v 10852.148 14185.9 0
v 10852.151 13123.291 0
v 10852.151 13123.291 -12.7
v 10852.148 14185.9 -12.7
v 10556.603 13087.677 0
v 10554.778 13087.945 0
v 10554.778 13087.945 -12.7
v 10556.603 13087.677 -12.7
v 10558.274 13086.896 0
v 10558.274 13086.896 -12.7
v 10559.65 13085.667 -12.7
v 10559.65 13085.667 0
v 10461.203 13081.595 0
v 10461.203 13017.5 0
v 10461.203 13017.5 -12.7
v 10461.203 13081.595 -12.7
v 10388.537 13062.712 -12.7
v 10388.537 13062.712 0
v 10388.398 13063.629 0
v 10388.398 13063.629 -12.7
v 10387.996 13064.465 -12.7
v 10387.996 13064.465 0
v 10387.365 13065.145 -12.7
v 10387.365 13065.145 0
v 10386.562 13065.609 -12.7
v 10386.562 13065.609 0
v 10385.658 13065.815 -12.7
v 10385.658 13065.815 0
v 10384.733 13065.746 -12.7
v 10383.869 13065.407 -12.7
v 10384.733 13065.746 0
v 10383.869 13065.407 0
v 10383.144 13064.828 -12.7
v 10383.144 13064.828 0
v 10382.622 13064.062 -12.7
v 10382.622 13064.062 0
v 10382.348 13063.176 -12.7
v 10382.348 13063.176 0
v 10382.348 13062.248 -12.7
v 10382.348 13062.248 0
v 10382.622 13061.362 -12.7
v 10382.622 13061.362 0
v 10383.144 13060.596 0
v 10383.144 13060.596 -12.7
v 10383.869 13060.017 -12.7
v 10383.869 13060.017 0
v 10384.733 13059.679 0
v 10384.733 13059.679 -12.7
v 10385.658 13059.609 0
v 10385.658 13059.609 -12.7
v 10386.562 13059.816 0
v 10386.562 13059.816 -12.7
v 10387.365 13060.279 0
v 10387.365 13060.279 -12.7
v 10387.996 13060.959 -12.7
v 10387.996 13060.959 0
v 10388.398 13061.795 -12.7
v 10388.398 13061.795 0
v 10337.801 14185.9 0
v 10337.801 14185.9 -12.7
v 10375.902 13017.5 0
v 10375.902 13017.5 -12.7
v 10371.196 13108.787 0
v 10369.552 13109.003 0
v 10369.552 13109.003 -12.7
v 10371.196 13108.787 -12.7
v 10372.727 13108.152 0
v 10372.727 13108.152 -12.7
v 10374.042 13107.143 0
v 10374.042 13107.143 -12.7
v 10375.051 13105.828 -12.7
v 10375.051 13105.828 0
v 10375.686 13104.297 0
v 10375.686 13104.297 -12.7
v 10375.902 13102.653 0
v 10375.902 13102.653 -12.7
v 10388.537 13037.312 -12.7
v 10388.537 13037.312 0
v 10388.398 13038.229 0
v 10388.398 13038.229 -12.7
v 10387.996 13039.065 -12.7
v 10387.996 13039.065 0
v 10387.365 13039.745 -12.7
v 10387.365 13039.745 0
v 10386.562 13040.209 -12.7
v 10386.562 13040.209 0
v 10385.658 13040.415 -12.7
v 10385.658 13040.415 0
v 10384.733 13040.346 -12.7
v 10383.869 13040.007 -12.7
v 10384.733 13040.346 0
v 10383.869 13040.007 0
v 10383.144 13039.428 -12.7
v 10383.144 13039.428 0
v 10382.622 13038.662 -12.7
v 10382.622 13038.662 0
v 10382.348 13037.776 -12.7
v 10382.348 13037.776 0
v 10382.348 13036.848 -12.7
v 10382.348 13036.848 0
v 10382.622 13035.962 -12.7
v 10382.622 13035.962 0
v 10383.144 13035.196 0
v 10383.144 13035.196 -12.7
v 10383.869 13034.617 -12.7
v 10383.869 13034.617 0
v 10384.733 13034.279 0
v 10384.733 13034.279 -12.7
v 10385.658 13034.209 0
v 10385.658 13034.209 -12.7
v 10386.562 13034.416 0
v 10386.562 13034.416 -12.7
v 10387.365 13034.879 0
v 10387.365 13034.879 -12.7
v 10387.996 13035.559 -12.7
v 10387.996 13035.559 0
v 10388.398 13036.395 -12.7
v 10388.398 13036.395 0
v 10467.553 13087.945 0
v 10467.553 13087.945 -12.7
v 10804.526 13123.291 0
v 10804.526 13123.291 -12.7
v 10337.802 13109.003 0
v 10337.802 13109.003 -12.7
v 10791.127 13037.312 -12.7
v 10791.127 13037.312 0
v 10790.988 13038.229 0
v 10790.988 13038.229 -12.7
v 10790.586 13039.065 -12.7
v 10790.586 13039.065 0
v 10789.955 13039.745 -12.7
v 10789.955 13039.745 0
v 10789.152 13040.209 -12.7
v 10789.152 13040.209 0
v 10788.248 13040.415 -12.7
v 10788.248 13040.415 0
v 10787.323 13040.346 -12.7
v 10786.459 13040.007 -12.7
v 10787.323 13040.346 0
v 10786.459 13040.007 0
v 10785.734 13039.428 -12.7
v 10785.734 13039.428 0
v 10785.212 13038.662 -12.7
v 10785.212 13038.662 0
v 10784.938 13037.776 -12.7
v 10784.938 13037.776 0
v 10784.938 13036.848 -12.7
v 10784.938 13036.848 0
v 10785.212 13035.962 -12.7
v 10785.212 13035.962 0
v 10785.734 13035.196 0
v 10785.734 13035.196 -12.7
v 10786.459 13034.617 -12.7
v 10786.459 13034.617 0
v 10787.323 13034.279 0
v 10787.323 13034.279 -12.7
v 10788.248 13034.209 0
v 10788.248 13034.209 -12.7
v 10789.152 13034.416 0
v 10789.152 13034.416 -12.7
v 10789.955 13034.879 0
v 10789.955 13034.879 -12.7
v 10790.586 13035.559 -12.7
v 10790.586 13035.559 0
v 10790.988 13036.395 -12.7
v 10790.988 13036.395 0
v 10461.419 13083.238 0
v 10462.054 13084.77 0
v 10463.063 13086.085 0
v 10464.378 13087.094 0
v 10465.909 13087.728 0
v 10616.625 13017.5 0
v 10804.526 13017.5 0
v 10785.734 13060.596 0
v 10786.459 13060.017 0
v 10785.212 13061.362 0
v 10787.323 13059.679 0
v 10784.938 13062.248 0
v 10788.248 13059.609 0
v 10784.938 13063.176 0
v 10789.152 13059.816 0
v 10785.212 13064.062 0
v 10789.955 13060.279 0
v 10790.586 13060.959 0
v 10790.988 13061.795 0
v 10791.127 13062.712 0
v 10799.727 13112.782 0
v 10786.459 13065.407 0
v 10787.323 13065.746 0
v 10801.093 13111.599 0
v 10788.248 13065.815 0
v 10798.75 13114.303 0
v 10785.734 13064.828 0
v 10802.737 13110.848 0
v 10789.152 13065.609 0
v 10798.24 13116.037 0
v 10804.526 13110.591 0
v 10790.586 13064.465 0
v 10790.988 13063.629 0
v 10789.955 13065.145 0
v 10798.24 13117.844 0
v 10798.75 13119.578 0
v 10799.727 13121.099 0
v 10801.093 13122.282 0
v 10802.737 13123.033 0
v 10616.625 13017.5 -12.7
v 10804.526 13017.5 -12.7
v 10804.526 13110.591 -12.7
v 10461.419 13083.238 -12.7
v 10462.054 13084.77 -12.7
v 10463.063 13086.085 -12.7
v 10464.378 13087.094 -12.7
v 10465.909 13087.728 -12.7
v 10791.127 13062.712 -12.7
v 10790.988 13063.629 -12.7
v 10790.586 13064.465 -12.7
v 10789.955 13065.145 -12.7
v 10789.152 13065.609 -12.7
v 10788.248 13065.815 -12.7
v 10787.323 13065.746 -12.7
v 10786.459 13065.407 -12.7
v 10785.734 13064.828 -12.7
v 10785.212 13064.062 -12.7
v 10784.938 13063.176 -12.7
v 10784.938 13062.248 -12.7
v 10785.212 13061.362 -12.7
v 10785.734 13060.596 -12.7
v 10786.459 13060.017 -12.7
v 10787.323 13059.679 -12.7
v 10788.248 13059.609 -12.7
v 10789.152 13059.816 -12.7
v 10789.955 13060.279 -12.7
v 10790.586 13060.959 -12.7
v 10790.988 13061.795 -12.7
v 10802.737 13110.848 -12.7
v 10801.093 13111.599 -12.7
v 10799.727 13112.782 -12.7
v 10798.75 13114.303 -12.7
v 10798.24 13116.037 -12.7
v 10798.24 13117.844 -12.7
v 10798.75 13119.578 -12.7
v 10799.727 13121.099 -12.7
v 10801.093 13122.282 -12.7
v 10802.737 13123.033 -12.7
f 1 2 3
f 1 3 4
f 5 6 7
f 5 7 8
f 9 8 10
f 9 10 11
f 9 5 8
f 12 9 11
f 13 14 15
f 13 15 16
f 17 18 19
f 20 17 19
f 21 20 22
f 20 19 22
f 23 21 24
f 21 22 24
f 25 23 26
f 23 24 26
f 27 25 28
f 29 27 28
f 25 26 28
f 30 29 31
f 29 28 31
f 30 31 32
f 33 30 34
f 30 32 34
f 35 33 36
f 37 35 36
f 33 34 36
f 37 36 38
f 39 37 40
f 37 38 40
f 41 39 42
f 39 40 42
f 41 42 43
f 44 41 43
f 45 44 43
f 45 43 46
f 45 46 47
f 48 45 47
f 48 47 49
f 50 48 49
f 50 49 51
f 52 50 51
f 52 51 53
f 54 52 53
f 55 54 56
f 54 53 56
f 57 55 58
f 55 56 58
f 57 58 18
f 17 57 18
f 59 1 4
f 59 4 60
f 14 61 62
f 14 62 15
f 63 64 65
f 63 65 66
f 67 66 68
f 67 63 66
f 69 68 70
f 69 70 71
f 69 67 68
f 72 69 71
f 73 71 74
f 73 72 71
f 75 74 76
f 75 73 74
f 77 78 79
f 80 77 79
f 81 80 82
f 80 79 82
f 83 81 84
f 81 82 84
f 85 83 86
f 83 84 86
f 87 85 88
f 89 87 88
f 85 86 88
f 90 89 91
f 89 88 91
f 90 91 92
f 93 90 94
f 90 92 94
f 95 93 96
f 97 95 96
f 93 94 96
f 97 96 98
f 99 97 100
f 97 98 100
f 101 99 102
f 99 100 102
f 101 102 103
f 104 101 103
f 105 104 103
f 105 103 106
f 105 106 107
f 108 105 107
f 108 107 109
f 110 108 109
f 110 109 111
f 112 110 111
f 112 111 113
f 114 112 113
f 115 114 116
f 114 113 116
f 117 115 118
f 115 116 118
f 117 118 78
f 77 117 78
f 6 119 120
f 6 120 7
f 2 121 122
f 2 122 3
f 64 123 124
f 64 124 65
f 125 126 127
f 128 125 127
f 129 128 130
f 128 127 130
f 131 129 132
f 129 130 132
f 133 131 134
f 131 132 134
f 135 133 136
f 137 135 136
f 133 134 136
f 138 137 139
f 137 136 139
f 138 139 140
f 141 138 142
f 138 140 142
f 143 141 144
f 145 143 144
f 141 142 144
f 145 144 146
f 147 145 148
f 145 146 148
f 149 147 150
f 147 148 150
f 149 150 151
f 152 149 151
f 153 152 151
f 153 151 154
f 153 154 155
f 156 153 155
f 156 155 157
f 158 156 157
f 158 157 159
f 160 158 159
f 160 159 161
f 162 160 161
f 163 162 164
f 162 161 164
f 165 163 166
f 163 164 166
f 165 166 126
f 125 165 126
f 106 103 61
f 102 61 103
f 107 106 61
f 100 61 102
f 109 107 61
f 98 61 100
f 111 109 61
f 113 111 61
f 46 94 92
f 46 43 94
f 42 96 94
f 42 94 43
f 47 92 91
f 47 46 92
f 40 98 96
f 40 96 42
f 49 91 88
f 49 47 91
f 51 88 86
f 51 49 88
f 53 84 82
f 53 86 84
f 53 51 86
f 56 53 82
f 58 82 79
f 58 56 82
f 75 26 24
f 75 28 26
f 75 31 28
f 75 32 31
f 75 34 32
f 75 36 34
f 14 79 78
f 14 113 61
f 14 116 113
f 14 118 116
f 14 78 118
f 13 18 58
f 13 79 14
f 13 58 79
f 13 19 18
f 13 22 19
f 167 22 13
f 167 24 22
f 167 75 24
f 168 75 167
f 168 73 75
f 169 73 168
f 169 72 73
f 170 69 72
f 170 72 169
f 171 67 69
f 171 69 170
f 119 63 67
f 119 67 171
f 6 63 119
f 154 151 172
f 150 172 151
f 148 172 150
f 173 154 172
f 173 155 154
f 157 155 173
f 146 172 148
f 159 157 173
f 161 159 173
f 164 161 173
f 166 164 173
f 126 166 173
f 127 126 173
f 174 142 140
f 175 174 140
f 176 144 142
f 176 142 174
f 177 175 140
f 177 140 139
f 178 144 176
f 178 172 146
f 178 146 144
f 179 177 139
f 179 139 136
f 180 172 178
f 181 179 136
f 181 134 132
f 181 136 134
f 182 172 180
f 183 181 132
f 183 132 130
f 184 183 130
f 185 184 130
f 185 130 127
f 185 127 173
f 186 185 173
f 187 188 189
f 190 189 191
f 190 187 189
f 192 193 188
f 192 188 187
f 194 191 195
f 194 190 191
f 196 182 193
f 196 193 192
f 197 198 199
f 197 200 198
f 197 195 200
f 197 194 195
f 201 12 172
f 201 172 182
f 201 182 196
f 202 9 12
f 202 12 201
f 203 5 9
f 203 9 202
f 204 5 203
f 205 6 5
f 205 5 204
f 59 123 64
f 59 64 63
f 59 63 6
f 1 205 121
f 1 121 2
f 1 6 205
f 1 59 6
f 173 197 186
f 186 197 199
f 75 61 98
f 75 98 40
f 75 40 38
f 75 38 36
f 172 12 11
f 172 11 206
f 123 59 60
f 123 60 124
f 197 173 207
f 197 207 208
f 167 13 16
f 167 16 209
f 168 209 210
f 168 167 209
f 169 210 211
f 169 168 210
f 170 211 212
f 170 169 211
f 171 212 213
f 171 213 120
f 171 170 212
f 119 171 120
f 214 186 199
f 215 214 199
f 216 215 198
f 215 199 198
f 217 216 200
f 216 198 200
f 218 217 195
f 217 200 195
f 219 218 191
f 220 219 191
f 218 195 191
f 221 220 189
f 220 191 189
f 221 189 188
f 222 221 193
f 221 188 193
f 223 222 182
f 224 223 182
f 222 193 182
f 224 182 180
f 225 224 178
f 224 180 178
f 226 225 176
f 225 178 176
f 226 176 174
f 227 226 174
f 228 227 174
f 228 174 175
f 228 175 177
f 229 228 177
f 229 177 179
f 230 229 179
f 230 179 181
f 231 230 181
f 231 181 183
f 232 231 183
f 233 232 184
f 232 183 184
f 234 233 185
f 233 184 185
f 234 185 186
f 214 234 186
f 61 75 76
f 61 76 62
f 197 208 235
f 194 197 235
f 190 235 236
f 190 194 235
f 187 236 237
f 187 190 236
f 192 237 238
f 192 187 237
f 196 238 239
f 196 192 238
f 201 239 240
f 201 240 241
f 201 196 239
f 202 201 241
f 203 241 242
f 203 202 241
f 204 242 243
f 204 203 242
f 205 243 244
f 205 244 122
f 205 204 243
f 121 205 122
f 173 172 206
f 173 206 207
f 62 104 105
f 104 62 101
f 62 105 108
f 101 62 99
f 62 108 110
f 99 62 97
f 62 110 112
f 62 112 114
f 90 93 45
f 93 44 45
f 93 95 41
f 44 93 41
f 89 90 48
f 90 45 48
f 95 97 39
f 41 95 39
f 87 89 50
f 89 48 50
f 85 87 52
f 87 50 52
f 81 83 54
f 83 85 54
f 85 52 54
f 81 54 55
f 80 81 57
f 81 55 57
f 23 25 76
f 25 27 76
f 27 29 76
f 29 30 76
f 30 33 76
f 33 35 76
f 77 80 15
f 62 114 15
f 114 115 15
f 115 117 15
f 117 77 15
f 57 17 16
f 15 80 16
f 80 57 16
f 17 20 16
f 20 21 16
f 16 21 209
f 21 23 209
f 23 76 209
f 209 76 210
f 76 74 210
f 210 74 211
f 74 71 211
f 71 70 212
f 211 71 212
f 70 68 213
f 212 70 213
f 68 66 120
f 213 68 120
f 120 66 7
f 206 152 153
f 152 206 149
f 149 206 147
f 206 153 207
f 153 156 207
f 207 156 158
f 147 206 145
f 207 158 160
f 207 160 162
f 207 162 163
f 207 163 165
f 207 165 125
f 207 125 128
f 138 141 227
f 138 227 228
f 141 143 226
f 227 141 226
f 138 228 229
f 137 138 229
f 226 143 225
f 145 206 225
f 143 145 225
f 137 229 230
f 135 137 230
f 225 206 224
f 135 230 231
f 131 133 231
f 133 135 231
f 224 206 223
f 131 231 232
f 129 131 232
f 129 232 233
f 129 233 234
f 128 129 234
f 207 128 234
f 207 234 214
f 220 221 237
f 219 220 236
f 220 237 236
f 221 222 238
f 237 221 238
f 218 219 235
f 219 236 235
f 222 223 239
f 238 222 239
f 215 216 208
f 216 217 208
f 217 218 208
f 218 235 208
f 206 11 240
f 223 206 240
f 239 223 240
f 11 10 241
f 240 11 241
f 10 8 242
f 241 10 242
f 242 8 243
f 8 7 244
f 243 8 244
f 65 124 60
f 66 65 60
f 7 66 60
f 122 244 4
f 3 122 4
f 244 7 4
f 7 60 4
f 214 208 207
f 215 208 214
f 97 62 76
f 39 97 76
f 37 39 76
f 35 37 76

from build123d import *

# Parameters (mm, degrees)
EXTRUDE1_DEPTH     = 12.7
SKETCH3_R          = 3.1115
CUT_EXTRUDE1_DEPTH = 12.7


with BuildPart() as part:
    # Sketch2 → Extrude1 (new body)
    with BuildSketch(Plane.XY):
        with BuildLine():
            Line((10375.902142089, 13017.500110193), (10461.202782059, 13017.500110193))
            Line((10461.202782059, 13017.500110193), (10461.202782059, 13081.594724716))
            ThreePointArc((10461.202782059, 13081.594724716), (10463.062653998, 13086.084852777), (10467.552782059, 13087.944724716))
            Line((10467.552782059, 13087.944724716), (10554.77765388, 13087.944724716))
            ThreePointArc((10554.77765388, 13087.944724716), (10557.466824452, 13087.347190416), (10559.649893716, 13085.667043341))
            Line((10559.649893716, 13085.667043341), (10616.625223517, 13017.500110193))
            Line((10616.625223517, 13017.500110193), (10804.525747814, 13017.500110193))
            Line((10804.525747814, 13017.500110193), (10804.525747814, 13110.590509206))
            ThreePointArc((10804.525747814, 13110.590509206), (10798.175747814, 13116.940509206), (10804.525747814, 13123.290509206))
            Line((10804.525747814, 13123.290509206), (10852.150747814, 13123.290509206))
            Line((10852.150747814, 13123.290509206), (10852.147924282, 14185.900110193))
            Line((10852.147924282, 14185.900110193), (10337.800747814, 14185.900110193))
            Line((10337.800747814, 14185.900110193), (10337.802142089, 13109.003009206))
            Line((10337.802142089, 13109.003009206), (10369.552142089, 13109.003009206))
            ThreePointArc((10369.552142089, 13109.003009206), (10374.042270149, 13107.143137266), (10375.902142089, 13102.653009206))
            Line((10375.902142089, 13102.653009206), (10375.902142089, 13017.500110193))
        make_face()
    extrude(amount=-EXTRUDE1_DEPTH)

    # Sketch3 → Cut-Extrude1 (cut)
    with BuildSketch(Plane.XY):
        with Locations((10385.425050678, 13062.712110193)):
            Circle(SKETCH3_R)
        with Locations((10385.425050678, 13037.312110193)):
            Circle(SKETCH3_R)
        with Locations((10788.015050678, 13062.712110193)):
            Circle(SKETCH3_R)
        with Locations((10788.015050678, 13037.312110193)):
            Circle(SKETCH3_R)
    extrude(amount=-CUT_EXTRUDE1_DEPTH, mode=Mode.SUBTRACT)


solid = part.part
